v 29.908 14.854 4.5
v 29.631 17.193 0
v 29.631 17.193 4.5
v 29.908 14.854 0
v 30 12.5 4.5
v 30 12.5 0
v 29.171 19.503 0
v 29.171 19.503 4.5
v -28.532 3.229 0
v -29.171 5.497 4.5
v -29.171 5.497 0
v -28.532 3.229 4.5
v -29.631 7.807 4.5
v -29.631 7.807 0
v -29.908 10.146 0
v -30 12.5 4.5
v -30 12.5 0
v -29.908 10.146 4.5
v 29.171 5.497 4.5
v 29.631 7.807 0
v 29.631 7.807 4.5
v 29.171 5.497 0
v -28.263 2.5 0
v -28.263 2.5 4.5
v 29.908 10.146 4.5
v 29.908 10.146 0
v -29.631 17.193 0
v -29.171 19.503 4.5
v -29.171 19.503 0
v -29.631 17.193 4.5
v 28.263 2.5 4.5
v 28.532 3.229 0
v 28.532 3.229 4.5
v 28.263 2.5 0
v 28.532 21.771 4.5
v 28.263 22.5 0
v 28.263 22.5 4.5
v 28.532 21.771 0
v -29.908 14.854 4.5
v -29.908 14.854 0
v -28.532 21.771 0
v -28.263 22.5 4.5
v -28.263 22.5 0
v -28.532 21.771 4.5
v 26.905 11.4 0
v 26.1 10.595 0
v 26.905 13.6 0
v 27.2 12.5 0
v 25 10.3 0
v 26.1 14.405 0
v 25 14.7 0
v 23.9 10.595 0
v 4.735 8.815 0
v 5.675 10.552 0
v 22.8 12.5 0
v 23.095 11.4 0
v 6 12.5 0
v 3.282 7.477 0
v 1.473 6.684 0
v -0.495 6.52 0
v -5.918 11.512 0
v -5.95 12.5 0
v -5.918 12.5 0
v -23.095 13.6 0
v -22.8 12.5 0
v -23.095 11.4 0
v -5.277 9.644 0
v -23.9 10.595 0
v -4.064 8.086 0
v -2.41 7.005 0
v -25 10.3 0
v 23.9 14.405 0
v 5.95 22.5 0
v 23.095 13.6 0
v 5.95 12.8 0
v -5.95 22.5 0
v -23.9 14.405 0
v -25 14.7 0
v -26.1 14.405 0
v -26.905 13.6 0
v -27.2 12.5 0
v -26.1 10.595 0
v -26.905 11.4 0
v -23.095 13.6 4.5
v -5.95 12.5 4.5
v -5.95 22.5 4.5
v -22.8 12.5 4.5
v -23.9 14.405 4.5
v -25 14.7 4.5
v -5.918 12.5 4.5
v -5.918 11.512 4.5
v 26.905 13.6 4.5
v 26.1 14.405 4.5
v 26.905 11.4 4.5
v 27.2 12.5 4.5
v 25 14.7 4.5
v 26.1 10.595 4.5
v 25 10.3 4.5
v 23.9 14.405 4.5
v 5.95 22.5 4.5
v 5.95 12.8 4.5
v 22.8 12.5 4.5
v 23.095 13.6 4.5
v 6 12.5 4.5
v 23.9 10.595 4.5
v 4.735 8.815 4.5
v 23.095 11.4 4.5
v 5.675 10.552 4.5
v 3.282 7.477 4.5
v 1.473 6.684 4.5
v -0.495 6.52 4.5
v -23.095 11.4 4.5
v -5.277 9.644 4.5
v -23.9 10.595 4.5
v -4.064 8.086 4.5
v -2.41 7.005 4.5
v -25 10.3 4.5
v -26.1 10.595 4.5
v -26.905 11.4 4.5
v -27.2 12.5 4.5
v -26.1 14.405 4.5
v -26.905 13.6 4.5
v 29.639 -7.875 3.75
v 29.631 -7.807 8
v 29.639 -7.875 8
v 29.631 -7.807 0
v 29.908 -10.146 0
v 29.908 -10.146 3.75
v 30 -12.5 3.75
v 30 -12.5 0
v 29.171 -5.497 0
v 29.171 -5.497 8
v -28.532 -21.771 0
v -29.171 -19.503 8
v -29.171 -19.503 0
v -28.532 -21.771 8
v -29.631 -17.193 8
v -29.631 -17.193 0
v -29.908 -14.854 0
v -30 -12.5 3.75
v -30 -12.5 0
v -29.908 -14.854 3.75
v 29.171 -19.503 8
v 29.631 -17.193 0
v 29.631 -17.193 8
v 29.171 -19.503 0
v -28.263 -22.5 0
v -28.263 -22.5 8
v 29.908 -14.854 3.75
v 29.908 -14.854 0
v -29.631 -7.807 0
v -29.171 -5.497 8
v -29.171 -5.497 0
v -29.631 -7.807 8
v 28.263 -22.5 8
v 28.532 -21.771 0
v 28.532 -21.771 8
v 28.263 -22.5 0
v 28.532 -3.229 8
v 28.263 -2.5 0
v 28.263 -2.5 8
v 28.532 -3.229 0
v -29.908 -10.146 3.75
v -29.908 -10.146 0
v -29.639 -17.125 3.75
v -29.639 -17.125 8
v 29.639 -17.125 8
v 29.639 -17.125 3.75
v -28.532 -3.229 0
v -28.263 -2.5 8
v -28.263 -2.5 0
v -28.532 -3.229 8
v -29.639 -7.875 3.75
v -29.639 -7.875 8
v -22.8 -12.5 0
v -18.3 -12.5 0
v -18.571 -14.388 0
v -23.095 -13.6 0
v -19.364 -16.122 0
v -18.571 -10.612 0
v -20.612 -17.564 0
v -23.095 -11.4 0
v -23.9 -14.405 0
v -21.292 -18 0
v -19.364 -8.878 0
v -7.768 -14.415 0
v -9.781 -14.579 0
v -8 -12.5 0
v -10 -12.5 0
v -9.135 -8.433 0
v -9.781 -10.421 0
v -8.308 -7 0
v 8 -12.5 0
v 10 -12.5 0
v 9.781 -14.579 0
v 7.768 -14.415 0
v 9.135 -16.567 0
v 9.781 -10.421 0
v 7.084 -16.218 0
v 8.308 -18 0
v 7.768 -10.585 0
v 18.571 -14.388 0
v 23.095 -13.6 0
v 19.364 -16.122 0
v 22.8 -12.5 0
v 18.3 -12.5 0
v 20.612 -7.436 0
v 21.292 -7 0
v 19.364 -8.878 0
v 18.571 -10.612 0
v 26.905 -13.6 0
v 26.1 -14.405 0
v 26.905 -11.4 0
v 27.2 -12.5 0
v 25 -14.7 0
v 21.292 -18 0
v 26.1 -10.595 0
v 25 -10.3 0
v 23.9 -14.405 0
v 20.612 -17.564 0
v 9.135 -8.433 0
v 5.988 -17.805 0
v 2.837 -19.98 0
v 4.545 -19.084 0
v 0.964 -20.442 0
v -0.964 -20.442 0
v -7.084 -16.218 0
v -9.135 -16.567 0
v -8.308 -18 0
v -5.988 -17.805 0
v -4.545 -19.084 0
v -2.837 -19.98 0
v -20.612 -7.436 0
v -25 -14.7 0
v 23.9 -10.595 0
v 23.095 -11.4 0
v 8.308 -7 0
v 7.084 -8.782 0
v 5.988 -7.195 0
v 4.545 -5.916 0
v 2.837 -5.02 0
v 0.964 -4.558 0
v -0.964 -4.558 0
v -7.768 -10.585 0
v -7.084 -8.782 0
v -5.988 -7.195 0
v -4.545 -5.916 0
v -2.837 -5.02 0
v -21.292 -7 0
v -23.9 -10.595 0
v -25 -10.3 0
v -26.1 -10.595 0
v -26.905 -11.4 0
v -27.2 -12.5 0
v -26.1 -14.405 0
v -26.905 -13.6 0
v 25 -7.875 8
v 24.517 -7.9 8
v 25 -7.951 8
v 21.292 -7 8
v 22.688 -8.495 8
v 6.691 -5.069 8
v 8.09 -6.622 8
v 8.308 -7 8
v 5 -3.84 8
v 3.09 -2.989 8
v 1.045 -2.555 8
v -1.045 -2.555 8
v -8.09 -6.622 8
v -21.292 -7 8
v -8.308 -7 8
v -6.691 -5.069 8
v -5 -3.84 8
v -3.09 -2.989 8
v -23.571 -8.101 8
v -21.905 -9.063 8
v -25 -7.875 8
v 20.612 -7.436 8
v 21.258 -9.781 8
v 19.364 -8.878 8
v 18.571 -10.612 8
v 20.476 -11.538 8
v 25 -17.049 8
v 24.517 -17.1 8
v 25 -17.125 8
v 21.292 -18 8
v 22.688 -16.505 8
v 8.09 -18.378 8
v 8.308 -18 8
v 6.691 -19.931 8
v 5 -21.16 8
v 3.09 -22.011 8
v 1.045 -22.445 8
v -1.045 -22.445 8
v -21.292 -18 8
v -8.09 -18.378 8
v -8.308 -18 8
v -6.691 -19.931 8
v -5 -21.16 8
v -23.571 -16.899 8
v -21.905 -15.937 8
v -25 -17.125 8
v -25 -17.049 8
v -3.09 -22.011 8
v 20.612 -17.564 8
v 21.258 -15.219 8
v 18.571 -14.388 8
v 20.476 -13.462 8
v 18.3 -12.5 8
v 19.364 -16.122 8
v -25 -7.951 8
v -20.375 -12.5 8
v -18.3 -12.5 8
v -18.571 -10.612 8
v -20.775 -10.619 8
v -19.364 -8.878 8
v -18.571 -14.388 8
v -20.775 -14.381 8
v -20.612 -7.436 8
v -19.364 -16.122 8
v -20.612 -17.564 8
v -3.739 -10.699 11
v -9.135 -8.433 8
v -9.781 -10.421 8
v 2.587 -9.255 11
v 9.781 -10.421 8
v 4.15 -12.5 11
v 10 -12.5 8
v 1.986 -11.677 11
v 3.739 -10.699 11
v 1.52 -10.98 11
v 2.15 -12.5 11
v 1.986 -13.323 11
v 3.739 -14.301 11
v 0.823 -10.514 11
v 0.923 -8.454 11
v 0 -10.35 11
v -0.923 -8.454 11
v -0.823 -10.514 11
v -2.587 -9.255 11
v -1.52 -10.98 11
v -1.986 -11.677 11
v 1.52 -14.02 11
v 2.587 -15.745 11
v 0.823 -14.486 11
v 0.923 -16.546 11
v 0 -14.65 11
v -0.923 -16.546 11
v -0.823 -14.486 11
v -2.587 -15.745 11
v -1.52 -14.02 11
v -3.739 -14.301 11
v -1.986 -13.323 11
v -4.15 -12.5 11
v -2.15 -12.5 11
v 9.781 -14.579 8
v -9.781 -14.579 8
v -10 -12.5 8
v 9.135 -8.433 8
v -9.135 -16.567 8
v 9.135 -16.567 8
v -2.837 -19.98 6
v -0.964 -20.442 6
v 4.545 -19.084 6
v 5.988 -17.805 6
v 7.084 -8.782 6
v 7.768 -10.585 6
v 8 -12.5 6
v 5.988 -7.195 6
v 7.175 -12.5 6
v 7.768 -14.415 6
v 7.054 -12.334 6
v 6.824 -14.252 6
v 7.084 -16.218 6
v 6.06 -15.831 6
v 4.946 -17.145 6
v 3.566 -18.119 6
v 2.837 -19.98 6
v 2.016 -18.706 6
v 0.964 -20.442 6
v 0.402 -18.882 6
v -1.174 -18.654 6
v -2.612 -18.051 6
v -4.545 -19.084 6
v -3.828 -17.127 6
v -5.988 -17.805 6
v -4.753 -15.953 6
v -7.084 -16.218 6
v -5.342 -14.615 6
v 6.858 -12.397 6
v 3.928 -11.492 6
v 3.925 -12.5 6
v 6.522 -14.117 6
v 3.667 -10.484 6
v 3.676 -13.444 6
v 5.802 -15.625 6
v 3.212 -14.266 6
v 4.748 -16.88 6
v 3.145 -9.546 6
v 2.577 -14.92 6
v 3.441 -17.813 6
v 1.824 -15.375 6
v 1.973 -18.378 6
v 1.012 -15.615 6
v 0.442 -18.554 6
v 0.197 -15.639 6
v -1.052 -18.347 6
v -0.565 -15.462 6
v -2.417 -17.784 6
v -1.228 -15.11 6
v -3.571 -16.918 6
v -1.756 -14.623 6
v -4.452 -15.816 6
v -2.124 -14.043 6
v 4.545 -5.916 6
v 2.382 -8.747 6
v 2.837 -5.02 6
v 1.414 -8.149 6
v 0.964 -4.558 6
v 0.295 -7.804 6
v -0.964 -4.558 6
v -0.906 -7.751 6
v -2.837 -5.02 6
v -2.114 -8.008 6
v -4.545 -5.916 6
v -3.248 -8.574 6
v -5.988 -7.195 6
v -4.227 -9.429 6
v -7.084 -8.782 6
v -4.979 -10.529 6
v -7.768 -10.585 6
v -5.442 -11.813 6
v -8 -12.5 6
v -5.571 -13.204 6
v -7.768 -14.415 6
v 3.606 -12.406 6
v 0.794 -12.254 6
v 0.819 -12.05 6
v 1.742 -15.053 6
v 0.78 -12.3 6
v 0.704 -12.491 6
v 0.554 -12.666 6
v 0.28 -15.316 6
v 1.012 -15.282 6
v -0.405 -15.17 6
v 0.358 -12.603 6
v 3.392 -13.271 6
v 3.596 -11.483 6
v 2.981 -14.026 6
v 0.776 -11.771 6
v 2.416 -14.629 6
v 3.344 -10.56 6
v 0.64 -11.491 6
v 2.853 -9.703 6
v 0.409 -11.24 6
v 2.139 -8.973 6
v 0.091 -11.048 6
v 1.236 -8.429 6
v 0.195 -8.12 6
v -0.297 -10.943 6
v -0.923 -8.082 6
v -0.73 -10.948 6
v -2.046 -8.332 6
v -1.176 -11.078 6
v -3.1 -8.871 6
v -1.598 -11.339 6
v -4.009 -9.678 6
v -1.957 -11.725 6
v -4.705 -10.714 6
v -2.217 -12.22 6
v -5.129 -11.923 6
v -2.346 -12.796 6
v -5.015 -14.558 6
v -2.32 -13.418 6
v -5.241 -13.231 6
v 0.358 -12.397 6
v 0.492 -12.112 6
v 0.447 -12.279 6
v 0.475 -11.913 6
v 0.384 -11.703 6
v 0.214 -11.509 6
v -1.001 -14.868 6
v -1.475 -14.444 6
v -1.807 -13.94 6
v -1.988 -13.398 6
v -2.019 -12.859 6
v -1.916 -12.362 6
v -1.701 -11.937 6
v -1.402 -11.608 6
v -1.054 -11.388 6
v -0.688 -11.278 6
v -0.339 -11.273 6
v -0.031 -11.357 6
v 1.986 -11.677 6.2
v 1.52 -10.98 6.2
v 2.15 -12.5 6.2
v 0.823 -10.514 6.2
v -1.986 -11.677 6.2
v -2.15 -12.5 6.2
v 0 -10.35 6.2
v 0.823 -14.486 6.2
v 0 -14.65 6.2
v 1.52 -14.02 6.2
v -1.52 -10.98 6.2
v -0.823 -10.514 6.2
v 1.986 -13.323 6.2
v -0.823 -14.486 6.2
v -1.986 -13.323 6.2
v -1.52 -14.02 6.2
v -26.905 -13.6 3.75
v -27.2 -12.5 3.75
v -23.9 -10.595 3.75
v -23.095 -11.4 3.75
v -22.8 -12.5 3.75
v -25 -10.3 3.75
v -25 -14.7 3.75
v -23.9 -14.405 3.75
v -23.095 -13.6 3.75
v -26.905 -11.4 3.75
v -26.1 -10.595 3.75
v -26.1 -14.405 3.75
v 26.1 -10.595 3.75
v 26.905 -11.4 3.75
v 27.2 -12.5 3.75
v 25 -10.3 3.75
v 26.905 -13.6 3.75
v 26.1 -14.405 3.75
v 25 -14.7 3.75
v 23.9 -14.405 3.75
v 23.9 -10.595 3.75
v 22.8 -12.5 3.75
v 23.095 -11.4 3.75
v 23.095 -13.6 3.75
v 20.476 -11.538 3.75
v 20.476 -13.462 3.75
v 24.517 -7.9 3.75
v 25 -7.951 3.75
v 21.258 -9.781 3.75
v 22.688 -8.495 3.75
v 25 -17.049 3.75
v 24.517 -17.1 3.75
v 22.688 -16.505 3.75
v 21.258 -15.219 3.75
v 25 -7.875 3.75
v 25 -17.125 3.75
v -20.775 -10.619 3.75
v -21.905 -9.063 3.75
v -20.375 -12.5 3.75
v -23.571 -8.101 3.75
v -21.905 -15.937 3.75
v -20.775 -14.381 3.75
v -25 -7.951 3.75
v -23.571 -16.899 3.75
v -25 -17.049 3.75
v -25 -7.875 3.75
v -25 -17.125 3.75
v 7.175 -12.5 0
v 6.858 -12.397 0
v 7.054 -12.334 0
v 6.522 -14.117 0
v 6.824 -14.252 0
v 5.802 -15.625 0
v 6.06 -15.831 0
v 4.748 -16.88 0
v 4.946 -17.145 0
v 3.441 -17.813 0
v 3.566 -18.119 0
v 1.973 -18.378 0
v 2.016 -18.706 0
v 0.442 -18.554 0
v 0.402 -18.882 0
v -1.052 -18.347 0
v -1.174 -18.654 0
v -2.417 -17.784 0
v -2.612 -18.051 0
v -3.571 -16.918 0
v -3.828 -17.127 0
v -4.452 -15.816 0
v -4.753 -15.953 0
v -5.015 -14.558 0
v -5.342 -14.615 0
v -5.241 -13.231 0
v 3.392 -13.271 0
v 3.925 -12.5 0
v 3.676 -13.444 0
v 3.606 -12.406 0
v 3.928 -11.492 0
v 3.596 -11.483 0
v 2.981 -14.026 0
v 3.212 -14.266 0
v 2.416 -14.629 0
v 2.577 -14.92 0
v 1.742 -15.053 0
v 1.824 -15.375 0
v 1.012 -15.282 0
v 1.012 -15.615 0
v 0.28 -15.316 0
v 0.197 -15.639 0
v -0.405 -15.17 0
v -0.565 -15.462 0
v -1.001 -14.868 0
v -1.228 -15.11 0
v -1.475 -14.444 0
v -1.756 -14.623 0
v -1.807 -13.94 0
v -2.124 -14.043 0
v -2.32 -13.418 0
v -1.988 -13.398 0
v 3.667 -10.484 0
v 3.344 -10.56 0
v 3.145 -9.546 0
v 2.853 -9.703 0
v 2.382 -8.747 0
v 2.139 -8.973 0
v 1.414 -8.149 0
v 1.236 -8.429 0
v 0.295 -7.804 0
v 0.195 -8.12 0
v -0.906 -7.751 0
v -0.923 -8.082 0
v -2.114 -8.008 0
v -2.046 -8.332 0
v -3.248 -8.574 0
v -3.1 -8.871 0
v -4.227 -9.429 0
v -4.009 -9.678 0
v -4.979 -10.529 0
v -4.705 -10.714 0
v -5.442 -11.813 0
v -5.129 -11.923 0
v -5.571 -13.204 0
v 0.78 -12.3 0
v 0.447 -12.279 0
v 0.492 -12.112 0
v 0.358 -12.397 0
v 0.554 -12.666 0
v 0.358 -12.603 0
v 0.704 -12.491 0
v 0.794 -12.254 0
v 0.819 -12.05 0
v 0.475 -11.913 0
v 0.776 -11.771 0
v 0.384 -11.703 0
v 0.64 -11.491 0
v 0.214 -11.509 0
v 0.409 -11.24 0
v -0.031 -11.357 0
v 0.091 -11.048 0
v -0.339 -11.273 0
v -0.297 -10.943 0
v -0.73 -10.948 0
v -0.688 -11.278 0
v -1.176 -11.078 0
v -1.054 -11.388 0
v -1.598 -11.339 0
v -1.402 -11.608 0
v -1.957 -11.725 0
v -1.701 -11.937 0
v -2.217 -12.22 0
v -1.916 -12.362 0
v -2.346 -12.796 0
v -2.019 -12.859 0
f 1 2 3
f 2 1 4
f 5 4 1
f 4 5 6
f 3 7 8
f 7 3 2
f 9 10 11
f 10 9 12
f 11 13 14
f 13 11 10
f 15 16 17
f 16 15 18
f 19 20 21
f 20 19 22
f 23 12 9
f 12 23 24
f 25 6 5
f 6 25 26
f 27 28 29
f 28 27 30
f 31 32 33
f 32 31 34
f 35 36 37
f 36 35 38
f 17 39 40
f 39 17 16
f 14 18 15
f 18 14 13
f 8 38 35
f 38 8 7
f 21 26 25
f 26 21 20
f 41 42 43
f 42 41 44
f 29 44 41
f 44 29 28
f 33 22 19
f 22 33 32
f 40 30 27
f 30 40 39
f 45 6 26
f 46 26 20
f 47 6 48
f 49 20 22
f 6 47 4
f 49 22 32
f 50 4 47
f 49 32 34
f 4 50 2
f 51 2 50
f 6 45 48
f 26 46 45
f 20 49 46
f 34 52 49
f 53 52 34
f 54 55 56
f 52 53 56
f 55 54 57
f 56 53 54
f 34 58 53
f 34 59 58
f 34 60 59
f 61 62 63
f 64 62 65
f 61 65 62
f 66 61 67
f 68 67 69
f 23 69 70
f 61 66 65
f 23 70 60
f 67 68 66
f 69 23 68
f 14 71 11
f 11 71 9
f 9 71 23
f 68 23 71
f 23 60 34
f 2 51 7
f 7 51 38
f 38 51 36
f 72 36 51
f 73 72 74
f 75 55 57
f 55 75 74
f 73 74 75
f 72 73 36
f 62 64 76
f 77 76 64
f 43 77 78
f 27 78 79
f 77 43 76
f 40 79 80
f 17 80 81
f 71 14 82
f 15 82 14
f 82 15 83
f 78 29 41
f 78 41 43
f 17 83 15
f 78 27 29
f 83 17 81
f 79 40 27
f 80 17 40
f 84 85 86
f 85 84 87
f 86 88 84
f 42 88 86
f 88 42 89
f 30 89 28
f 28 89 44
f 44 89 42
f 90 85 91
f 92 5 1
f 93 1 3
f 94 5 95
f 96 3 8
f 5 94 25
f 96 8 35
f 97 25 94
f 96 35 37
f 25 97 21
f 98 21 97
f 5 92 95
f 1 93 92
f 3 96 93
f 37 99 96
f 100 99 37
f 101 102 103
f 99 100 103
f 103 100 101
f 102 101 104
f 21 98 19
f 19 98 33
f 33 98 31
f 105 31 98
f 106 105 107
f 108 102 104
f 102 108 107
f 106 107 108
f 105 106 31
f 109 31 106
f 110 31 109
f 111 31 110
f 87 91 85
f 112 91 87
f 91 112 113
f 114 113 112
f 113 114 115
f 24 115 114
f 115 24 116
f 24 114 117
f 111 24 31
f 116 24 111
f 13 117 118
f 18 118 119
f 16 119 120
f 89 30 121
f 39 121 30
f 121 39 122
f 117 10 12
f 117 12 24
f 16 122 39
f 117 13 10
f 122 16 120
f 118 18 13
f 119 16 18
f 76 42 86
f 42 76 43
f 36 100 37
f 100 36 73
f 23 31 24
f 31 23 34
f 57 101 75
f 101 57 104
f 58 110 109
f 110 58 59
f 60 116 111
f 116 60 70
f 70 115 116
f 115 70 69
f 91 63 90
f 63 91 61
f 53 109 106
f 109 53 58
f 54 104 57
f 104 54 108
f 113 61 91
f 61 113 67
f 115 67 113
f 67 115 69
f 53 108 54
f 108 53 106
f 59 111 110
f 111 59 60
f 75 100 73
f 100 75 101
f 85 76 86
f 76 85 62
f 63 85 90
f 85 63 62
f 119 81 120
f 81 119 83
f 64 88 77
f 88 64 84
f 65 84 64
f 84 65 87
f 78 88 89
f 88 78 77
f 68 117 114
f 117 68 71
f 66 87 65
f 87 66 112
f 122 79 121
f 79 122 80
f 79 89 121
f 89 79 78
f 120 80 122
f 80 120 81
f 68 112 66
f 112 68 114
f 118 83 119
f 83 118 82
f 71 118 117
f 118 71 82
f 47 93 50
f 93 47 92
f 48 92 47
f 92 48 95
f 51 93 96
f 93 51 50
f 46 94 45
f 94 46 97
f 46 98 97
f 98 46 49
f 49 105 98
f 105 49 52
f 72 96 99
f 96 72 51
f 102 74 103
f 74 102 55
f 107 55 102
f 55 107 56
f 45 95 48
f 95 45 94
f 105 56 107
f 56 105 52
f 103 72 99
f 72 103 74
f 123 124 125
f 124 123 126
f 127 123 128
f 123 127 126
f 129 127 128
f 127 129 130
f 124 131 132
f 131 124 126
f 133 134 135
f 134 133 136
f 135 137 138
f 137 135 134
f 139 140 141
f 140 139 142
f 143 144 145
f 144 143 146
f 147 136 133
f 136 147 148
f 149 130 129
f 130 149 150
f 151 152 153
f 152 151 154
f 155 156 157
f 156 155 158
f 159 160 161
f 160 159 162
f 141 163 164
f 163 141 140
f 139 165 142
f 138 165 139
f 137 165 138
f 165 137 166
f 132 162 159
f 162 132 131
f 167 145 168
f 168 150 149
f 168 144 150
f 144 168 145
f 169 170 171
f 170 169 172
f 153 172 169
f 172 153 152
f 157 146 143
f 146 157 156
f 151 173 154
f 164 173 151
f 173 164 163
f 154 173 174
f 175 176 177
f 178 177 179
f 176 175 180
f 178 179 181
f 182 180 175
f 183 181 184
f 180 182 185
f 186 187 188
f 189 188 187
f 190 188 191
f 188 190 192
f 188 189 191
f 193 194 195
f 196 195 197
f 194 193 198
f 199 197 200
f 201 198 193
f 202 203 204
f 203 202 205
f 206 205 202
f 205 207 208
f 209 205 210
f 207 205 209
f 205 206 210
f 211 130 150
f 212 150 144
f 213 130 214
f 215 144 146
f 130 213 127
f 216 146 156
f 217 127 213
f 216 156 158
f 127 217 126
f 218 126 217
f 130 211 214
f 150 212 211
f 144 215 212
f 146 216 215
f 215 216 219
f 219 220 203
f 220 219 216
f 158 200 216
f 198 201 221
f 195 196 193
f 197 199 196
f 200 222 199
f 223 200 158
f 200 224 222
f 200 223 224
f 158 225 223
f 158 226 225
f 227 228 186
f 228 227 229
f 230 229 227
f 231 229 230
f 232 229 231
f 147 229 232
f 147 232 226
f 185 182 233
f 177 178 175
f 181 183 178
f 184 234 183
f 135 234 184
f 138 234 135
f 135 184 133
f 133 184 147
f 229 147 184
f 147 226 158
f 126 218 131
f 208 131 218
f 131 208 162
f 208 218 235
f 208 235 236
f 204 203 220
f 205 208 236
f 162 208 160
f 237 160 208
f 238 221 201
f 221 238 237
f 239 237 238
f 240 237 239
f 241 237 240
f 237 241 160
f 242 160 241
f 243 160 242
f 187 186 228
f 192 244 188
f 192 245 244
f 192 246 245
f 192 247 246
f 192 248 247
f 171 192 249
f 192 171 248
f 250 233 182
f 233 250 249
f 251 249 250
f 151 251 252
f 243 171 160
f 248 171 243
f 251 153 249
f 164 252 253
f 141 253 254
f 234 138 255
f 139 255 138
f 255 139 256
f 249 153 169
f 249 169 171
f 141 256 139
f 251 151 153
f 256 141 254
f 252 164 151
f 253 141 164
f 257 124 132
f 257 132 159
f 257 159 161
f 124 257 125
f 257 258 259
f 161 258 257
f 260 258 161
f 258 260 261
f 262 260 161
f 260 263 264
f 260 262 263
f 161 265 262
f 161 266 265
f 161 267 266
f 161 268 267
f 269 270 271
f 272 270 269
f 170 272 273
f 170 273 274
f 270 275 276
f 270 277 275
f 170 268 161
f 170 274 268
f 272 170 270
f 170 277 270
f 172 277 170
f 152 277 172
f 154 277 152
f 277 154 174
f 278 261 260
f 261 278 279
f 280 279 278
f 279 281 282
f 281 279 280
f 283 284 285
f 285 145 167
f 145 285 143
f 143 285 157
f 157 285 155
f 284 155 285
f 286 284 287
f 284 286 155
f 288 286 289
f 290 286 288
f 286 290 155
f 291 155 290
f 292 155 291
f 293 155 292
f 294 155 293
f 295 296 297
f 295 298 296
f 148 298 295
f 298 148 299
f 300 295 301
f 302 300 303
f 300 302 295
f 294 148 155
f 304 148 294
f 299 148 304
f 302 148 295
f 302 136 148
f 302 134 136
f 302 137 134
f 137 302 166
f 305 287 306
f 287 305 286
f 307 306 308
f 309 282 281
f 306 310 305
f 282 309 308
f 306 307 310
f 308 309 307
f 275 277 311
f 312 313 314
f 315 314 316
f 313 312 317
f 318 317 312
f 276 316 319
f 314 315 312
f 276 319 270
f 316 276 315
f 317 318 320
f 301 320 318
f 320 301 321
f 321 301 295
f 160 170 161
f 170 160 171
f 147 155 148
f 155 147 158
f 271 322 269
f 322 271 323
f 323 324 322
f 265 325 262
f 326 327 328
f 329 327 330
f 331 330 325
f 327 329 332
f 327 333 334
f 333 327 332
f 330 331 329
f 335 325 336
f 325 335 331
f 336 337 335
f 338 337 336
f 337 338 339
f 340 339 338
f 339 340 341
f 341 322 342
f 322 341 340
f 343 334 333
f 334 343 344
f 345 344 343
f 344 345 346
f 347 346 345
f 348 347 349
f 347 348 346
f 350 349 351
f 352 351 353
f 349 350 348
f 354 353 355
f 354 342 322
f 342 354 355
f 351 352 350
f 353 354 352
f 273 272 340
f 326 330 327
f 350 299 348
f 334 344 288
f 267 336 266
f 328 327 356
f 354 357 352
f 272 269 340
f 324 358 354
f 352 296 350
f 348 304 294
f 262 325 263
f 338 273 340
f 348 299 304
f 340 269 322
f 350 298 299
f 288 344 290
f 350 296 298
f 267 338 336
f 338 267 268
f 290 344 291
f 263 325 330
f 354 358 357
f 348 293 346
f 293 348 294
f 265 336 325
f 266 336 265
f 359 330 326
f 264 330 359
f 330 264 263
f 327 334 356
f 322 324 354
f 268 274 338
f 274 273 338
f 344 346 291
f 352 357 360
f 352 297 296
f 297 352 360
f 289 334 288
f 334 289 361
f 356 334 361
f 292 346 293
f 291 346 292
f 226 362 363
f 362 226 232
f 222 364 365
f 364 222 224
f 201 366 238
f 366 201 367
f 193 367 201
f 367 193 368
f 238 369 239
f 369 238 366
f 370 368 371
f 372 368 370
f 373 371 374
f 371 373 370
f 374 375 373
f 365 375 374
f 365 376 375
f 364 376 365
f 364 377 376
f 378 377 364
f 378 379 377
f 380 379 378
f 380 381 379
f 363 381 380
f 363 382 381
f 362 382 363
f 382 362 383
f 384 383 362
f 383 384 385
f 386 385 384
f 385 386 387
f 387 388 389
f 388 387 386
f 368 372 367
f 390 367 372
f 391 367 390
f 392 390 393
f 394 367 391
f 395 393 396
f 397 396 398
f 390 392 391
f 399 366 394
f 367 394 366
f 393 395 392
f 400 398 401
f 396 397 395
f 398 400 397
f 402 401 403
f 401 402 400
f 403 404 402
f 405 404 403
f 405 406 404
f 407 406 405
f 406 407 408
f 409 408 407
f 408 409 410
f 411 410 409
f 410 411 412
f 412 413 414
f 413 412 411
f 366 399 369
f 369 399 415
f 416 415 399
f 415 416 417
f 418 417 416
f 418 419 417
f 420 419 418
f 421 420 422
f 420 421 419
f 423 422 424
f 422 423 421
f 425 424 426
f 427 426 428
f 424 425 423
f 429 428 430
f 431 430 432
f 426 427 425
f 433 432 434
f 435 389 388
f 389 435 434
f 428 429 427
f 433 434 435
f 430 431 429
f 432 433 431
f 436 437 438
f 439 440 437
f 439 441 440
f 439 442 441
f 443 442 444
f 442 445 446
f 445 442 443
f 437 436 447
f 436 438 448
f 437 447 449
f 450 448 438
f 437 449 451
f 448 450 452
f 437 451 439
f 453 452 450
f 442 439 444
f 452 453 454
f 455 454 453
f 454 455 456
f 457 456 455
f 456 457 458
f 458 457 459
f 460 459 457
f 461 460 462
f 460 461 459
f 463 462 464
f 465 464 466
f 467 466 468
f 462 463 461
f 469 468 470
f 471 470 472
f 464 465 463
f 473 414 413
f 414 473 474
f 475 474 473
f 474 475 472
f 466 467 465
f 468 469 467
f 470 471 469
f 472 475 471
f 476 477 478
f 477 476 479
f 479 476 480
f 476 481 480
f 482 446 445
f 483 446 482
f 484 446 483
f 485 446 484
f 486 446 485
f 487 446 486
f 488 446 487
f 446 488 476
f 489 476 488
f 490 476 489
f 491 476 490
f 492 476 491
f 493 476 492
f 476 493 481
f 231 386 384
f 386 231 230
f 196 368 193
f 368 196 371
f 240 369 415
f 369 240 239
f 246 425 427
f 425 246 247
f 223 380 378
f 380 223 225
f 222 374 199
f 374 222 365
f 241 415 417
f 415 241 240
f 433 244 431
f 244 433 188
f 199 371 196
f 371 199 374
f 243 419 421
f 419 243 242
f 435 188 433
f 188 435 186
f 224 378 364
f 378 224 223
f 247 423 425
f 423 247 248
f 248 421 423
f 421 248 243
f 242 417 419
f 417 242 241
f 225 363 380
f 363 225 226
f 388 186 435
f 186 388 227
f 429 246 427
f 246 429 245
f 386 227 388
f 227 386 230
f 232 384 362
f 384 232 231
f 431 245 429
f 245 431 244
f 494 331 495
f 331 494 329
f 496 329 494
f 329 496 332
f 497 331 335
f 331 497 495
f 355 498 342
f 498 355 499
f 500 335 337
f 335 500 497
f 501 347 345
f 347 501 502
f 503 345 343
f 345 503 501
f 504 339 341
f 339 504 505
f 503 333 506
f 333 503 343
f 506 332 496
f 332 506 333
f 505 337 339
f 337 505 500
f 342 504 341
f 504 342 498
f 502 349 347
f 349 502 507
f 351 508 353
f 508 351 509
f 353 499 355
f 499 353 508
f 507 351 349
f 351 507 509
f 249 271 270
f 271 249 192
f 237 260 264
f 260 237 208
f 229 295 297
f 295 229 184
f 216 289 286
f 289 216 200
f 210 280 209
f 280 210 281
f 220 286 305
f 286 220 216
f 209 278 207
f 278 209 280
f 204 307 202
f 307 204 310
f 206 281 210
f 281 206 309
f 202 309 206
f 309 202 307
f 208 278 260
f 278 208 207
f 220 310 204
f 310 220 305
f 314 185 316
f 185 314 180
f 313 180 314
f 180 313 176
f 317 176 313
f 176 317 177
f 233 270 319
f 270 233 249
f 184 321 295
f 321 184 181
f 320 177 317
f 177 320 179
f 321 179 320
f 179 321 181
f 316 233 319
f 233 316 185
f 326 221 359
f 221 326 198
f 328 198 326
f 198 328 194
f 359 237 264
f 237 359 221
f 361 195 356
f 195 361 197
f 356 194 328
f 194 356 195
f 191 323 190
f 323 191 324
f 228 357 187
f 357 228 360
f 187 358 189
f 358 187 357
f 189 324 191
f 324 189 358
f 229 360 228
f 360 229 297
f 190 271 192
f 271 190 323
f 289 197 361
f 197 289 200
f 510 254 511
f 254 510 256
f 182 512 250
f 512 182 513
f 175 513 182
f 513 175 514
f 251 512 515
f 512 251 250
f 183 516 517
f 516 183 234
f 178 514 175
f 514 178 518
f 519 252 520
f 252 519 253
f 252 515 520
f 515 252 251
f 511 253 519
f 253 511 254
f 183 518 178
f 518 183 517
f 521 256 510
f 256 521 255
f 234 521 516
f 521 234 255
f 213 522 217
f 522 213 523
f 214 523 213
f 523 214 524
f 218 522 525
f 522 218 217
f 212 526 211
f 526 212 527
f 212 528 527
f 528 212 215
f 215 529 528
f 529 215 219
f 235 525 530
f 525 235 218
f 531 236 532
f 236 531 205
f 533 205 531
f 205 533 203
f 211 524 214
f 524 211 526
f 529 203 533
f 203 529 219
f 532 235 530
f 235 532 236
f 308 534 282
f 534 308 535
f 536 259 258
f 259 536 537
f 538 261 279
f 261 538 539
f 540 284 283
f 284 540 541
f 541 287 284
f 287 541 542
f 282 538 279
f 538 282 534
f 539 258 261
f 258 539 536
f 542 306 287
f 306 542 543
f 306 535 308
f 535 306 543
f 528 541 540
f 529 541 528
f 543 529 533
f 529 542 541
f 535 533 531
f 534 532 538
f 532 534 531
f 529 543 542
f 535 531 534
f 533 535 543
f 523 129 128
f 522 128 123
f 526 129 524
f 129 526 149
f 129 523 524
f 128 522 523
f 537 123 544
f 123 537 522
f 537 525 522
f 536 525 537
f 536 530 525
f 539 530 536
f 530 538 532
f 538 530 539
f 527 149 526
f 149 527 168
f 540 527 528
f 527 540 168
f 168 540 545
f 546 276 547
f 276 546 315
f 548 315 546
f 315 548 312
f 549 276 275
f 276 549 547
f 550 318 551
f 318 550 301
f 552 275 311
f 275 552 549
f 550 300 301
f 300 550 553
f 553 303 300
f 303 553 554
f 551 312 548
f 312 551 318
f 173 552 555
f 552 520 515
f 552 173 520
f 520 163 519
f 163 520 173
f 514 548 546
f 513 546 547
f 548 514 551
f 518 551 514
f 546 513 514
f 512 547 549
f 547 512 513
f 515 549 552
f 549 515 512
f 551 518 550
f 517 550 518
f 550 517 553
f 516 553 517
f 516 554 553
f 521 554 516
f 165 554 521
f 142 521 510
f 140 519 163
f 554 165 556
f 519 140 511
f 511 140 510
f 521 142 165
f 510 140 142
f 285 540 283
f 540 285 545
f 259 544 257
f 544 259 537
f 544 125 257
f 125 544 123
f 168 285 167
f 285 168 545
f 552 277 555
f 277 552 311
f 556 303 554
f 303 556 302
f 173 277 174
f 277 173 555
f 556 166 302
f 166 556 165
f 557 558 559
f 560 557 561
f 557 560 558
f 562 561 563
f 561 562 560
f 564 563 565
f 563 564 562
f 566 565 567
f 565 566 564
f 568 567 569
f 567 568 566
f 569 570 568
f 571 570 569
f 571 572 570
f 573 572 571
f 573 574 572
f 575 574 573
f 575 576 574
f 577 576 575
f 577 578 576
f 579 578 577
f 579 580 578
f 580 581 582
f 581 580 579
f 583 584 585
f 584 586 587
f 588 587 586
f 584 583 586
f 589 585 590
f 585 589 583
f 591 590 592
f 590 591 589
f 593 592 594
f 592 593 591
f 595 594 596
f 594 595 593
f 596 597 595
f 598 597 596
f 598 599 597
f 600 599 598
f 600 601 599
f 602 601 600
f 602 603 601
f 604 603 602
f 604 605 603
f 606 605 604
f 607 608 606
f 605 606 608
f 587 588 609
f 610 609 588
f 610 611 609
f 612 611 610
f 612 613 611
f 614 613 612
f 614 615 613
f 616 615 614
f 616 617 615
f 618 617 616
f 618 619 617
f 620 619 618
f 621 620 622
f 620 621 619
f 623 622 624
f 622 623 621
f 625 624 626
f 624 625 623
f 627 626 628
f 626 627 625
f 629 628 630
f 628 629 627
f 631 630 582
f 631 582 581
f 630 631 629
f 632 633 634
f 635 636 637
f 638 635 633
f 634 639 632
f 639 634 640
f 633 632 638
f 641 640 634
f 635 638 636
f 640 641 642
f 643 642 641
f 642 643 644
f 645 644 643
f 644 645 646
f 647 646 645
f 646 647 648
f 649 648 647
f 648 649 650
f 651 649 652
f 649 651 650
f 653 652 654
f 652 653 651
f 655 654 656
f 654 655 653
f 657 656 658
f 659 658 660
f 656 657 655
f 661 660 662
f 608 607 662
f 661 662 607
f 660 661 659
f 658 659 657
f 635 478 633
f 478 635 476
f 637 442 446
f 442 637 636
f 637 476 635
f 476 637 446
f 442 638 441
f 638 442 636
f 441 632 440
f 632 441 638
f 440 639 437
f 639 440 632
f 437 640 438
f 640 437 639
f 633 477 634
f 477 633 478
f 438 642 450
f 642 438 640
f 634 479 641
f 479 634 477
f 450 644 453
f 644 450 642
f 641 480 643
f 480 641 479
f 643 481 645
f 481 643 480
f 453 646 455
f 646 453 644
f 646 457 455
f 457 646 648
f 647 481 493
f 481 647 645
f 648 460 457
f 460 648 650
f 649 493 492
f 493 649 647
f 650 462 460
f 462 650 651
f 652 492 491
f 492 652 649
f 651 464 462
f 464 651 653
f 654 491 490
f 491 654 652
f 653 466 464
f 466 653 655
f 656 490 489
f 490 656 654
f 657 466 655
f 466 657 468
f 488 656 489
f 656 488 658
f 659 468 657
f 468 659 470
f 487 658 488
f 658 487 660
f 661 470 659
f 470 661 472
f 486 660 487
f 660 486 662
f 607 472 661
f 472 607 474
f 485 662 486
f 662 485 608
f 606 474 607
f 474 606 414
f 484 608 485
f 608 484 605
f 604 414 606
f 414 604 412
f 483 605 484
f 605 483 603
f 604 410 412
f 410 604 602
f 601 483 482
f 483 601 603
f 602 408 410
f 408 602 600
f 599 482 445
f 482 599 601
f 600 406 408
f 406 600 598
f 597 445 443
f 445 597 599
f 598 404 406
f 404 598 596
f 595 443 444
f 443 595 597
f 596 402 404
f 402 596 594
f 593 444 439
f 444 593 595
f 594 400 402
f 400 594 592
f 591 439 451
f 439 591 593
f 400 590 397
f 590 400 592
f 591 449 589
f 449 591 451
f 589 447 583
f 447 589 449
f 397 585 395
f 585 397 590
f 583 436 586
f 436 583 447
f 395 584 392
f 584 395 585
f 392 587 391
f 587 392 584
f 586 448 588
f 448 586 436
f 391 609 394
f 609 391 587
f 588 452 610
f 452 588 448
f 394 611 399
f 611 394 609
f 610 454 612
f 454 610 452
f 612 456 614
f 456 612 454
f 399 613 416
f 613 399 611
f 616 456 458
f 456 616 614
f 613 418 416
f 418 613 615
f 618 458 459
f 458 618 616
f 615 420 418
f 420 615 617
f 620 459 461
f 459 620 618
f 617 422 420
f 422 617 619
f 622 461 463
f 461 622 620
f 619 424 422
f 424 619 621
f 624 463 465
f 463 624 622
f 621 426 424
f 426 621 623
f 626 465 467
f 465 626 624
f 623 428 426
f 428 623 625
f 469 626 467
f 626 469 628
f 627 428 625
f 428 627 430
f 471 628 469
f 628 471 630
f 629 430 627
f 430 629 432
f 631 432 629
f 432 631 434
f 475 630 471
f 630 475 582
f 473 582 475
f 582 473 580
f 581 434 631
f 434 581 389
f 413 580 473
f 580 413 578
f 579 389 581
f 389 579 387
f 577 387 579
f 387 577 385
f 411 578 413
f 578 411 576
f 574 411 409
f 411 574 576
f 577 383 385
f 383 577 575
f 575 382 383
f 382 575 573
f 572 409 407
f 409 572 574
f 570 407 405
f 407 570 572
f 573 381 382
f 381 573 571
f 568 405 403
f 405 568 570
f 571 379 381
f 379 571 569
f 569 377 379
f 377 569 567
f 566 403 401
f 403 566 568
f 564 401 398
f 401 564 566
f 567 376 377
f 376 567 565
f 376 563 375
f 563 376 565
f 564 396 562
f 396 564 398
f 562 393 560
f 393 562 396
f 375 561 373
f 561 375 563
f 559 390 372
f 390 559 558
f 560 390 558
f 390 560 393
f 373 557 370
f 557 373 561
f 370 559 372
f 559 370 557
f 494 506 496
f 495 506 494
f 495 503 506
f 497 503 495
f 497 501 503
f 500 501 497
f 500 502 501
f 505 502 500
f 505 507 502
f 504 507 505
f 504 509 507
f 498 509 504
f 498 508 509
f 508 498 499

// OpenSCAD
////////////////////////////////////////////////////////////////////////////////
// Simple J-Head Mount for Rostock (Customizable) - Version 0.2

// The height of the groove mount plate (the lower one).
plate_height = 4.5;
// The height of the holding plate (the upper one).
upper_height = 8;
// The width of the mount.
plate_width = 20;
// Generate cutouts between the pneumatic fitting hole and the bolt holes?
generate_cutouts = "Yes"; // [Yes,No]
// The width of the material on either side of the cutouts.
support_width = 4.5;
// The diameter of the Rostock platform. For a standard Rostock this is 60.
platform_diameter = 60;
// The bolt circle diameter of the Rostock platform. For a standard Rostock this is 50.
platform_bcd = 50;
// The diameter of the groove on the J-Head body. For a J-Head MK VI this is 12.
jhead_groove_diameter = 12.0;
// The diameter of the J-Head body. For a J-Head MK VI this is 16.
jhead_body_diameter = 16.0;
// The length of the J-Head body that is above the groove mount plate.
jhead_upper_height = 6.0;
// The bolt recess depth. If this value is too small then it will overridden to zero.
desired_bolt_recess_depth = 4.25;
// The hole size for the pneumatic fitting. This should be smaller than the outer thread size so that it can be tapped.
pneumatic_fitting_drill_diameter = 4.3;
// The length of threads on the pneumatic fitting.
pneumatic_fitting_thread_length = 5;
// Should supports be generated? 
generate_support = "Yes"; // [Yes,No]
// The layer height. This is used for generating the support.
layer_height = 0.20;
// The layer thickness/width. This is used for generating the support.
layer_width = 0.35;
// The distance between the two parts.
spacing = 5;
// What objects should be generated?
generate = "Both"; // [Both,Holding Plate,Groove Plate]
// Configuration of the groove mount plate and holding plate. Can be either single or double.
configuration = "Single"; // [Single,Double]
// The distance between the two J-Head bodies when mounted.
jhead_spacing = 2;

jhead_centers = (configuration=="Double")?[[-(jhead_body_diameter/2)-(jhead_spacing/2),0,0],[+(jhead_body_diameter/2)+(jhead_spacing/2),0,0]]:[[0,0,0]];


// Other Settings and stuff that arn't shown in customizer.
m4_clearance_diameter = 4.4*1;
m4_washer_diameter = 9.25*1;
wall_thickness_for_pneumatic_fitting = 2*1;
jhead_slot_width = jhead_groove_diameter-0.1;
bolt_recess_depth = (desired_bolt_recess_depth>=upper_height)?0:desired_bolt_recess_depth;
extra = 0.1*1;


////////////////////////////////////////////////////////////////////////////////
// spiral_support

module spiral_support(inner_diameter, outer_diameter, height, rotation=720,segments=50) {
	diff = (outer_diameter-inner_diameter)/2;
	for(i=[1:segments]) {
		hull() {
			rotate([0,0,(i-1)*(rotation/segments)]) translate([(inner_diameter/2)+((i-1)*(diff/segments)),0,0]) cylinder(r=layer_width/2,h=height);
			rotate([0,0,i*(rotation/segments)]) translate([(inner_diameter/2)+(i*(diff/segments)),0,0]) cylinder(r=layer_width/2,h=height);
		}
	}
}


////////////////////////////////////////////////////////////////////////////////
// jhead_mount_groove_plate

module jhead_mount_groove_plate() {
	translate([0,0,plate_height/2]) difference() {
		intersection() {
			cylinder(r=platform_diameter/2,h=plate_height,$fn=80,center=true);
			cube([platform_diameter,plate_width,plate_height],center=true);
		}
		translate([-platform_bcd/2,0,0]) cylinder(r=m4_clearance_diameter/2,h=plate_height+(2*extra),center=true,$fn=12);
		translate([platform_bcd/2,0,0]) cylinder(r=m4_clearance_diameter/2,h=plate_height+(2*extra),center=true,$fn=12);
		if(configuration=="Double") {
			translate([-(jhead_body_diameter/2)-(jhead_spacing/2),0,0]) cylinder(r=(jhead_groove_diameter/2),h=plate_height+(2*extra),center=true);
			translate([-(jhead_body_diameter/2)-(jhead_spacing/2),(plate_width/4)+(extra/2),0]) cube([jhead_slot_width,(plate_width/2)+extra,plate_height+(2*extra)],center=true);
			translate([+(jhead_body_diameter/2)+(jhead_spacing/2),0,0]) cylinder(r=(jhead_groove_diameter/2),h=plate_height+(2*extra),center=true);
			translate([(jhead_body_diameter/2)+(jhead_spacing/2),-(plate_width/4)-(extra/2),0]) cube([jhead_slot_width,(plate_width/2)+extra,plate_height+(2*extra)],center=true);
		} else if(configuration=="Single") {
			cylinder(r=(jhead_groove_diameter/2),h=plate_height+(2*extra),center=true);
			translate([0,(plate_width/4)+(extra/2),0]) cube([jhead_slot_width,(plate_width/2)+extra,plate_height+(2*extra)],center=true);
		}
	}
}


////////////////////////////////////////////////////////////////////////////////
// jhead_mount_holding_plate

module jhead_mount_holding_plate() {
	translate([0,0,upper_height/2]) {
		difference() {
			union() {
				hull() {
					for(i=jhead_centers) {
						translate([i[0],i[1],-(upper_height/2)+jhead_upper_height]) cylinder(r=(pneumatic_fitting_drill_diameter/2)+wall_thickness_for_pneumatic_fitting,h=pneumatic_fitting_thread_length);
						translate([i[0],i[1],-(upper_height/2)]) cylinder(r=(plate_width/2),h=max(upper_height,jhead_upper_height));
					}
				}
				intersection() {
					cylinder(r=platform_diameter/2,h=upper_height,center=true,$fn=80);
					cube([platform_diameter,plate_width,upper_height],center=true);
				}
			}
			translate([-platform_bcd/2,0,0]) cylinder(r=m4_clearance_diameter/2,h=upper_height+(2*extra),center=true,$fn=12);
			translate([platform_bcd/2,0,0]) cylinder(r=m4_clearance_diameter/2,h=upper_height+(2*extra),center=true,$fn=12);

	for(i=jhead_centers) {
			translate([i[0],i[1],-(upper_height/2)-extra]) cylinder(r=jhead_body_diameter/2,h=jhead_upper_height+(extra));
			translate([i[0],i[1],-(upper_height/2)+(jhead_upper_height)-extra]) cylinder(r=pneumatic_fitting_drill_diameter/2,h=max(pneumatic_fitting_thread_length+(2*extra),upper_height-jhead_upper_height+(2*extra)),$fn=16);
}
			if((generate_cutouts=="Yes")&&(configuration!="Double")) {
				difference() {
					intersection() {
						cube([platform_diameter,plate_width-(2*support_width),upper_height+(2*extra)],center=true);
						cylinder(r=(platform_diameter/2)-support_width,h=upper_height+(2*extra),center=true);
					}
					translate([platform_bcd/2,0,0]) cylinder(r=(m4_clearance_diameter/2)+support_width,h=upper_height+(2*extra),center=true);
					translate([-platform_bcd/2,0,0]) cylinder(r=(m4_clearance_diameter/2)+support_width,h=upper_height+(2*extra),center=true);
					for(i=jhead_centers) {
					translate([i[0],i[1],0]) cylinder(r=(plate_width/2),h=upper_height+(2*extra),center=true);
}
				}
			}
			translate([platform_bcd/2,0,(upper_height/2)-bolt_recess_depth]) cylinder(r=(m4_washer_diameter/2),h=bolt_recess_depth+extra);
			translate([-platform_bcd/2,0,(upper_height/2)-bolt_recess_depth]) cylinder(r=(m4_washer_diameter/2),h=bolt_recess_depth+extra);
			translate([platform_bcd/2,-(m4_washer_diameter/2),(upper_height/2)-bolt_recess_depth]) cube([((platform_diameter-platform_bcd)/2)+extra,m4_washer_diameter,bolt_recess_depth+extra]);
			translate([-(platform_bcd/2)-((platform_diameter-platform_bcd)/2)-extra,-(m4_washer_diameter/2),(upper_height/2)-bolt_recess_depth]) cube([((platform_diameter-platform_bcd)/2)+extra,m4_washer_diameter,bolt_recess_depth+extra]);
		}
		if(generate_support=="Yes") {
			for(i=jhead_centers) {
				translate([i[0],i[1],-upper_height/2]) spiral_support(outer_diameter=jhead_body_diameter-2,inner_diameter=1,height=jhead_upper_height,rotation=720);
				translate([i[0],i[1],-(upper_height/2)+jhead_upper_height]) cylinder(r=jhead_body_diameter/2,h=layer_height);
			}
		}
	}
}

////////////////////////////////////////////////////////////////////////////////
// Main

if(generate=="Both") {
	translate([0,(plate_width/2)+(spacing/2),0]) 
		jhead_mount_groove_plate();
	translate([0,-(plate_width/2)-(spacing/2),0])
		jhead_mount_holding_plate();
} else if(generate=="Groove Plate") {
	jhead_mount_groove_plate();
} else if(generate=="Holding Plate") {
	jhead_mount_holding_plate();
}
